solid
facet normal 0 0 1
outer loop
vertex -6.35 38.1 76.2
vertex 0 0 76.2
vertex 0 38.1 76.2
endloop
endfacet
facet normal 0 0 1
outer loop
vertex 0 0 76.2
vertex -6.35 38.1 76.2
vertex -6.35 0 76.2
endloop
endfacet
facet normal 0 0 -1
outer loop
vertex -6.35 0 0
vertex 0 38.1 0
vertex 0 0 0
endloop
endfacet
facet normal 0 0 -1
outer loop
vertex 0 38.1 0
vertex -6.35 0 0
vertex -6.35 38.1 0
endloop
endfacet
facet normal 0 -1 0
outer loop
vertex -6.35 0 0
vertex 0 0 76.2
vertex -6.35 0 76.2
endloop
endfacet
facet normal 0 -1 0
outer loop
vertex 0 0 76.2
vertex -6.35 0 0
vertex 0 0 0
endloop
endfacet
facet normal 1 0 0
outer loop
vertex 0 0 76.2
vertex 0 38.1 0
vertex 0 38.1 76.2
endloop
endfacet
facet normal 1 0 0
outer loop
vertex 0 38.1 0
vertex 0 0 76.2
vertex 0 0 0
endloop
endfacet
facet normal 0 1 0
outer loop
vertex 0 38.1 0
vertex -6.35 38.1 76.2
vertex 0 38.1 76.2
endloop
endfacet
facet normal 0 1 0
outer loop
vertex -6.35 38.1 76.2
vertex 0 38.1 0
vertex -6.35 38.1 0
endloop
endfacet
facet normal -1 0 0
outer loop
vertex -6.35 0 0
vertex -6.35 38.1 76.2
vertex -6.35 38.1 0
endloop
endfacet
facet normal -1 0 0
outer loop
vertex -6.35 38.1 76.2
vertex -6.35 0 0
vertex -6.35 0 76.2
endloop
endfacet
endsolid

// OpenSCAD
use <MCAD/gridbeam.scad>
$fa=1;
$fs=0.4;


frontBoard(1, 2, 30);
